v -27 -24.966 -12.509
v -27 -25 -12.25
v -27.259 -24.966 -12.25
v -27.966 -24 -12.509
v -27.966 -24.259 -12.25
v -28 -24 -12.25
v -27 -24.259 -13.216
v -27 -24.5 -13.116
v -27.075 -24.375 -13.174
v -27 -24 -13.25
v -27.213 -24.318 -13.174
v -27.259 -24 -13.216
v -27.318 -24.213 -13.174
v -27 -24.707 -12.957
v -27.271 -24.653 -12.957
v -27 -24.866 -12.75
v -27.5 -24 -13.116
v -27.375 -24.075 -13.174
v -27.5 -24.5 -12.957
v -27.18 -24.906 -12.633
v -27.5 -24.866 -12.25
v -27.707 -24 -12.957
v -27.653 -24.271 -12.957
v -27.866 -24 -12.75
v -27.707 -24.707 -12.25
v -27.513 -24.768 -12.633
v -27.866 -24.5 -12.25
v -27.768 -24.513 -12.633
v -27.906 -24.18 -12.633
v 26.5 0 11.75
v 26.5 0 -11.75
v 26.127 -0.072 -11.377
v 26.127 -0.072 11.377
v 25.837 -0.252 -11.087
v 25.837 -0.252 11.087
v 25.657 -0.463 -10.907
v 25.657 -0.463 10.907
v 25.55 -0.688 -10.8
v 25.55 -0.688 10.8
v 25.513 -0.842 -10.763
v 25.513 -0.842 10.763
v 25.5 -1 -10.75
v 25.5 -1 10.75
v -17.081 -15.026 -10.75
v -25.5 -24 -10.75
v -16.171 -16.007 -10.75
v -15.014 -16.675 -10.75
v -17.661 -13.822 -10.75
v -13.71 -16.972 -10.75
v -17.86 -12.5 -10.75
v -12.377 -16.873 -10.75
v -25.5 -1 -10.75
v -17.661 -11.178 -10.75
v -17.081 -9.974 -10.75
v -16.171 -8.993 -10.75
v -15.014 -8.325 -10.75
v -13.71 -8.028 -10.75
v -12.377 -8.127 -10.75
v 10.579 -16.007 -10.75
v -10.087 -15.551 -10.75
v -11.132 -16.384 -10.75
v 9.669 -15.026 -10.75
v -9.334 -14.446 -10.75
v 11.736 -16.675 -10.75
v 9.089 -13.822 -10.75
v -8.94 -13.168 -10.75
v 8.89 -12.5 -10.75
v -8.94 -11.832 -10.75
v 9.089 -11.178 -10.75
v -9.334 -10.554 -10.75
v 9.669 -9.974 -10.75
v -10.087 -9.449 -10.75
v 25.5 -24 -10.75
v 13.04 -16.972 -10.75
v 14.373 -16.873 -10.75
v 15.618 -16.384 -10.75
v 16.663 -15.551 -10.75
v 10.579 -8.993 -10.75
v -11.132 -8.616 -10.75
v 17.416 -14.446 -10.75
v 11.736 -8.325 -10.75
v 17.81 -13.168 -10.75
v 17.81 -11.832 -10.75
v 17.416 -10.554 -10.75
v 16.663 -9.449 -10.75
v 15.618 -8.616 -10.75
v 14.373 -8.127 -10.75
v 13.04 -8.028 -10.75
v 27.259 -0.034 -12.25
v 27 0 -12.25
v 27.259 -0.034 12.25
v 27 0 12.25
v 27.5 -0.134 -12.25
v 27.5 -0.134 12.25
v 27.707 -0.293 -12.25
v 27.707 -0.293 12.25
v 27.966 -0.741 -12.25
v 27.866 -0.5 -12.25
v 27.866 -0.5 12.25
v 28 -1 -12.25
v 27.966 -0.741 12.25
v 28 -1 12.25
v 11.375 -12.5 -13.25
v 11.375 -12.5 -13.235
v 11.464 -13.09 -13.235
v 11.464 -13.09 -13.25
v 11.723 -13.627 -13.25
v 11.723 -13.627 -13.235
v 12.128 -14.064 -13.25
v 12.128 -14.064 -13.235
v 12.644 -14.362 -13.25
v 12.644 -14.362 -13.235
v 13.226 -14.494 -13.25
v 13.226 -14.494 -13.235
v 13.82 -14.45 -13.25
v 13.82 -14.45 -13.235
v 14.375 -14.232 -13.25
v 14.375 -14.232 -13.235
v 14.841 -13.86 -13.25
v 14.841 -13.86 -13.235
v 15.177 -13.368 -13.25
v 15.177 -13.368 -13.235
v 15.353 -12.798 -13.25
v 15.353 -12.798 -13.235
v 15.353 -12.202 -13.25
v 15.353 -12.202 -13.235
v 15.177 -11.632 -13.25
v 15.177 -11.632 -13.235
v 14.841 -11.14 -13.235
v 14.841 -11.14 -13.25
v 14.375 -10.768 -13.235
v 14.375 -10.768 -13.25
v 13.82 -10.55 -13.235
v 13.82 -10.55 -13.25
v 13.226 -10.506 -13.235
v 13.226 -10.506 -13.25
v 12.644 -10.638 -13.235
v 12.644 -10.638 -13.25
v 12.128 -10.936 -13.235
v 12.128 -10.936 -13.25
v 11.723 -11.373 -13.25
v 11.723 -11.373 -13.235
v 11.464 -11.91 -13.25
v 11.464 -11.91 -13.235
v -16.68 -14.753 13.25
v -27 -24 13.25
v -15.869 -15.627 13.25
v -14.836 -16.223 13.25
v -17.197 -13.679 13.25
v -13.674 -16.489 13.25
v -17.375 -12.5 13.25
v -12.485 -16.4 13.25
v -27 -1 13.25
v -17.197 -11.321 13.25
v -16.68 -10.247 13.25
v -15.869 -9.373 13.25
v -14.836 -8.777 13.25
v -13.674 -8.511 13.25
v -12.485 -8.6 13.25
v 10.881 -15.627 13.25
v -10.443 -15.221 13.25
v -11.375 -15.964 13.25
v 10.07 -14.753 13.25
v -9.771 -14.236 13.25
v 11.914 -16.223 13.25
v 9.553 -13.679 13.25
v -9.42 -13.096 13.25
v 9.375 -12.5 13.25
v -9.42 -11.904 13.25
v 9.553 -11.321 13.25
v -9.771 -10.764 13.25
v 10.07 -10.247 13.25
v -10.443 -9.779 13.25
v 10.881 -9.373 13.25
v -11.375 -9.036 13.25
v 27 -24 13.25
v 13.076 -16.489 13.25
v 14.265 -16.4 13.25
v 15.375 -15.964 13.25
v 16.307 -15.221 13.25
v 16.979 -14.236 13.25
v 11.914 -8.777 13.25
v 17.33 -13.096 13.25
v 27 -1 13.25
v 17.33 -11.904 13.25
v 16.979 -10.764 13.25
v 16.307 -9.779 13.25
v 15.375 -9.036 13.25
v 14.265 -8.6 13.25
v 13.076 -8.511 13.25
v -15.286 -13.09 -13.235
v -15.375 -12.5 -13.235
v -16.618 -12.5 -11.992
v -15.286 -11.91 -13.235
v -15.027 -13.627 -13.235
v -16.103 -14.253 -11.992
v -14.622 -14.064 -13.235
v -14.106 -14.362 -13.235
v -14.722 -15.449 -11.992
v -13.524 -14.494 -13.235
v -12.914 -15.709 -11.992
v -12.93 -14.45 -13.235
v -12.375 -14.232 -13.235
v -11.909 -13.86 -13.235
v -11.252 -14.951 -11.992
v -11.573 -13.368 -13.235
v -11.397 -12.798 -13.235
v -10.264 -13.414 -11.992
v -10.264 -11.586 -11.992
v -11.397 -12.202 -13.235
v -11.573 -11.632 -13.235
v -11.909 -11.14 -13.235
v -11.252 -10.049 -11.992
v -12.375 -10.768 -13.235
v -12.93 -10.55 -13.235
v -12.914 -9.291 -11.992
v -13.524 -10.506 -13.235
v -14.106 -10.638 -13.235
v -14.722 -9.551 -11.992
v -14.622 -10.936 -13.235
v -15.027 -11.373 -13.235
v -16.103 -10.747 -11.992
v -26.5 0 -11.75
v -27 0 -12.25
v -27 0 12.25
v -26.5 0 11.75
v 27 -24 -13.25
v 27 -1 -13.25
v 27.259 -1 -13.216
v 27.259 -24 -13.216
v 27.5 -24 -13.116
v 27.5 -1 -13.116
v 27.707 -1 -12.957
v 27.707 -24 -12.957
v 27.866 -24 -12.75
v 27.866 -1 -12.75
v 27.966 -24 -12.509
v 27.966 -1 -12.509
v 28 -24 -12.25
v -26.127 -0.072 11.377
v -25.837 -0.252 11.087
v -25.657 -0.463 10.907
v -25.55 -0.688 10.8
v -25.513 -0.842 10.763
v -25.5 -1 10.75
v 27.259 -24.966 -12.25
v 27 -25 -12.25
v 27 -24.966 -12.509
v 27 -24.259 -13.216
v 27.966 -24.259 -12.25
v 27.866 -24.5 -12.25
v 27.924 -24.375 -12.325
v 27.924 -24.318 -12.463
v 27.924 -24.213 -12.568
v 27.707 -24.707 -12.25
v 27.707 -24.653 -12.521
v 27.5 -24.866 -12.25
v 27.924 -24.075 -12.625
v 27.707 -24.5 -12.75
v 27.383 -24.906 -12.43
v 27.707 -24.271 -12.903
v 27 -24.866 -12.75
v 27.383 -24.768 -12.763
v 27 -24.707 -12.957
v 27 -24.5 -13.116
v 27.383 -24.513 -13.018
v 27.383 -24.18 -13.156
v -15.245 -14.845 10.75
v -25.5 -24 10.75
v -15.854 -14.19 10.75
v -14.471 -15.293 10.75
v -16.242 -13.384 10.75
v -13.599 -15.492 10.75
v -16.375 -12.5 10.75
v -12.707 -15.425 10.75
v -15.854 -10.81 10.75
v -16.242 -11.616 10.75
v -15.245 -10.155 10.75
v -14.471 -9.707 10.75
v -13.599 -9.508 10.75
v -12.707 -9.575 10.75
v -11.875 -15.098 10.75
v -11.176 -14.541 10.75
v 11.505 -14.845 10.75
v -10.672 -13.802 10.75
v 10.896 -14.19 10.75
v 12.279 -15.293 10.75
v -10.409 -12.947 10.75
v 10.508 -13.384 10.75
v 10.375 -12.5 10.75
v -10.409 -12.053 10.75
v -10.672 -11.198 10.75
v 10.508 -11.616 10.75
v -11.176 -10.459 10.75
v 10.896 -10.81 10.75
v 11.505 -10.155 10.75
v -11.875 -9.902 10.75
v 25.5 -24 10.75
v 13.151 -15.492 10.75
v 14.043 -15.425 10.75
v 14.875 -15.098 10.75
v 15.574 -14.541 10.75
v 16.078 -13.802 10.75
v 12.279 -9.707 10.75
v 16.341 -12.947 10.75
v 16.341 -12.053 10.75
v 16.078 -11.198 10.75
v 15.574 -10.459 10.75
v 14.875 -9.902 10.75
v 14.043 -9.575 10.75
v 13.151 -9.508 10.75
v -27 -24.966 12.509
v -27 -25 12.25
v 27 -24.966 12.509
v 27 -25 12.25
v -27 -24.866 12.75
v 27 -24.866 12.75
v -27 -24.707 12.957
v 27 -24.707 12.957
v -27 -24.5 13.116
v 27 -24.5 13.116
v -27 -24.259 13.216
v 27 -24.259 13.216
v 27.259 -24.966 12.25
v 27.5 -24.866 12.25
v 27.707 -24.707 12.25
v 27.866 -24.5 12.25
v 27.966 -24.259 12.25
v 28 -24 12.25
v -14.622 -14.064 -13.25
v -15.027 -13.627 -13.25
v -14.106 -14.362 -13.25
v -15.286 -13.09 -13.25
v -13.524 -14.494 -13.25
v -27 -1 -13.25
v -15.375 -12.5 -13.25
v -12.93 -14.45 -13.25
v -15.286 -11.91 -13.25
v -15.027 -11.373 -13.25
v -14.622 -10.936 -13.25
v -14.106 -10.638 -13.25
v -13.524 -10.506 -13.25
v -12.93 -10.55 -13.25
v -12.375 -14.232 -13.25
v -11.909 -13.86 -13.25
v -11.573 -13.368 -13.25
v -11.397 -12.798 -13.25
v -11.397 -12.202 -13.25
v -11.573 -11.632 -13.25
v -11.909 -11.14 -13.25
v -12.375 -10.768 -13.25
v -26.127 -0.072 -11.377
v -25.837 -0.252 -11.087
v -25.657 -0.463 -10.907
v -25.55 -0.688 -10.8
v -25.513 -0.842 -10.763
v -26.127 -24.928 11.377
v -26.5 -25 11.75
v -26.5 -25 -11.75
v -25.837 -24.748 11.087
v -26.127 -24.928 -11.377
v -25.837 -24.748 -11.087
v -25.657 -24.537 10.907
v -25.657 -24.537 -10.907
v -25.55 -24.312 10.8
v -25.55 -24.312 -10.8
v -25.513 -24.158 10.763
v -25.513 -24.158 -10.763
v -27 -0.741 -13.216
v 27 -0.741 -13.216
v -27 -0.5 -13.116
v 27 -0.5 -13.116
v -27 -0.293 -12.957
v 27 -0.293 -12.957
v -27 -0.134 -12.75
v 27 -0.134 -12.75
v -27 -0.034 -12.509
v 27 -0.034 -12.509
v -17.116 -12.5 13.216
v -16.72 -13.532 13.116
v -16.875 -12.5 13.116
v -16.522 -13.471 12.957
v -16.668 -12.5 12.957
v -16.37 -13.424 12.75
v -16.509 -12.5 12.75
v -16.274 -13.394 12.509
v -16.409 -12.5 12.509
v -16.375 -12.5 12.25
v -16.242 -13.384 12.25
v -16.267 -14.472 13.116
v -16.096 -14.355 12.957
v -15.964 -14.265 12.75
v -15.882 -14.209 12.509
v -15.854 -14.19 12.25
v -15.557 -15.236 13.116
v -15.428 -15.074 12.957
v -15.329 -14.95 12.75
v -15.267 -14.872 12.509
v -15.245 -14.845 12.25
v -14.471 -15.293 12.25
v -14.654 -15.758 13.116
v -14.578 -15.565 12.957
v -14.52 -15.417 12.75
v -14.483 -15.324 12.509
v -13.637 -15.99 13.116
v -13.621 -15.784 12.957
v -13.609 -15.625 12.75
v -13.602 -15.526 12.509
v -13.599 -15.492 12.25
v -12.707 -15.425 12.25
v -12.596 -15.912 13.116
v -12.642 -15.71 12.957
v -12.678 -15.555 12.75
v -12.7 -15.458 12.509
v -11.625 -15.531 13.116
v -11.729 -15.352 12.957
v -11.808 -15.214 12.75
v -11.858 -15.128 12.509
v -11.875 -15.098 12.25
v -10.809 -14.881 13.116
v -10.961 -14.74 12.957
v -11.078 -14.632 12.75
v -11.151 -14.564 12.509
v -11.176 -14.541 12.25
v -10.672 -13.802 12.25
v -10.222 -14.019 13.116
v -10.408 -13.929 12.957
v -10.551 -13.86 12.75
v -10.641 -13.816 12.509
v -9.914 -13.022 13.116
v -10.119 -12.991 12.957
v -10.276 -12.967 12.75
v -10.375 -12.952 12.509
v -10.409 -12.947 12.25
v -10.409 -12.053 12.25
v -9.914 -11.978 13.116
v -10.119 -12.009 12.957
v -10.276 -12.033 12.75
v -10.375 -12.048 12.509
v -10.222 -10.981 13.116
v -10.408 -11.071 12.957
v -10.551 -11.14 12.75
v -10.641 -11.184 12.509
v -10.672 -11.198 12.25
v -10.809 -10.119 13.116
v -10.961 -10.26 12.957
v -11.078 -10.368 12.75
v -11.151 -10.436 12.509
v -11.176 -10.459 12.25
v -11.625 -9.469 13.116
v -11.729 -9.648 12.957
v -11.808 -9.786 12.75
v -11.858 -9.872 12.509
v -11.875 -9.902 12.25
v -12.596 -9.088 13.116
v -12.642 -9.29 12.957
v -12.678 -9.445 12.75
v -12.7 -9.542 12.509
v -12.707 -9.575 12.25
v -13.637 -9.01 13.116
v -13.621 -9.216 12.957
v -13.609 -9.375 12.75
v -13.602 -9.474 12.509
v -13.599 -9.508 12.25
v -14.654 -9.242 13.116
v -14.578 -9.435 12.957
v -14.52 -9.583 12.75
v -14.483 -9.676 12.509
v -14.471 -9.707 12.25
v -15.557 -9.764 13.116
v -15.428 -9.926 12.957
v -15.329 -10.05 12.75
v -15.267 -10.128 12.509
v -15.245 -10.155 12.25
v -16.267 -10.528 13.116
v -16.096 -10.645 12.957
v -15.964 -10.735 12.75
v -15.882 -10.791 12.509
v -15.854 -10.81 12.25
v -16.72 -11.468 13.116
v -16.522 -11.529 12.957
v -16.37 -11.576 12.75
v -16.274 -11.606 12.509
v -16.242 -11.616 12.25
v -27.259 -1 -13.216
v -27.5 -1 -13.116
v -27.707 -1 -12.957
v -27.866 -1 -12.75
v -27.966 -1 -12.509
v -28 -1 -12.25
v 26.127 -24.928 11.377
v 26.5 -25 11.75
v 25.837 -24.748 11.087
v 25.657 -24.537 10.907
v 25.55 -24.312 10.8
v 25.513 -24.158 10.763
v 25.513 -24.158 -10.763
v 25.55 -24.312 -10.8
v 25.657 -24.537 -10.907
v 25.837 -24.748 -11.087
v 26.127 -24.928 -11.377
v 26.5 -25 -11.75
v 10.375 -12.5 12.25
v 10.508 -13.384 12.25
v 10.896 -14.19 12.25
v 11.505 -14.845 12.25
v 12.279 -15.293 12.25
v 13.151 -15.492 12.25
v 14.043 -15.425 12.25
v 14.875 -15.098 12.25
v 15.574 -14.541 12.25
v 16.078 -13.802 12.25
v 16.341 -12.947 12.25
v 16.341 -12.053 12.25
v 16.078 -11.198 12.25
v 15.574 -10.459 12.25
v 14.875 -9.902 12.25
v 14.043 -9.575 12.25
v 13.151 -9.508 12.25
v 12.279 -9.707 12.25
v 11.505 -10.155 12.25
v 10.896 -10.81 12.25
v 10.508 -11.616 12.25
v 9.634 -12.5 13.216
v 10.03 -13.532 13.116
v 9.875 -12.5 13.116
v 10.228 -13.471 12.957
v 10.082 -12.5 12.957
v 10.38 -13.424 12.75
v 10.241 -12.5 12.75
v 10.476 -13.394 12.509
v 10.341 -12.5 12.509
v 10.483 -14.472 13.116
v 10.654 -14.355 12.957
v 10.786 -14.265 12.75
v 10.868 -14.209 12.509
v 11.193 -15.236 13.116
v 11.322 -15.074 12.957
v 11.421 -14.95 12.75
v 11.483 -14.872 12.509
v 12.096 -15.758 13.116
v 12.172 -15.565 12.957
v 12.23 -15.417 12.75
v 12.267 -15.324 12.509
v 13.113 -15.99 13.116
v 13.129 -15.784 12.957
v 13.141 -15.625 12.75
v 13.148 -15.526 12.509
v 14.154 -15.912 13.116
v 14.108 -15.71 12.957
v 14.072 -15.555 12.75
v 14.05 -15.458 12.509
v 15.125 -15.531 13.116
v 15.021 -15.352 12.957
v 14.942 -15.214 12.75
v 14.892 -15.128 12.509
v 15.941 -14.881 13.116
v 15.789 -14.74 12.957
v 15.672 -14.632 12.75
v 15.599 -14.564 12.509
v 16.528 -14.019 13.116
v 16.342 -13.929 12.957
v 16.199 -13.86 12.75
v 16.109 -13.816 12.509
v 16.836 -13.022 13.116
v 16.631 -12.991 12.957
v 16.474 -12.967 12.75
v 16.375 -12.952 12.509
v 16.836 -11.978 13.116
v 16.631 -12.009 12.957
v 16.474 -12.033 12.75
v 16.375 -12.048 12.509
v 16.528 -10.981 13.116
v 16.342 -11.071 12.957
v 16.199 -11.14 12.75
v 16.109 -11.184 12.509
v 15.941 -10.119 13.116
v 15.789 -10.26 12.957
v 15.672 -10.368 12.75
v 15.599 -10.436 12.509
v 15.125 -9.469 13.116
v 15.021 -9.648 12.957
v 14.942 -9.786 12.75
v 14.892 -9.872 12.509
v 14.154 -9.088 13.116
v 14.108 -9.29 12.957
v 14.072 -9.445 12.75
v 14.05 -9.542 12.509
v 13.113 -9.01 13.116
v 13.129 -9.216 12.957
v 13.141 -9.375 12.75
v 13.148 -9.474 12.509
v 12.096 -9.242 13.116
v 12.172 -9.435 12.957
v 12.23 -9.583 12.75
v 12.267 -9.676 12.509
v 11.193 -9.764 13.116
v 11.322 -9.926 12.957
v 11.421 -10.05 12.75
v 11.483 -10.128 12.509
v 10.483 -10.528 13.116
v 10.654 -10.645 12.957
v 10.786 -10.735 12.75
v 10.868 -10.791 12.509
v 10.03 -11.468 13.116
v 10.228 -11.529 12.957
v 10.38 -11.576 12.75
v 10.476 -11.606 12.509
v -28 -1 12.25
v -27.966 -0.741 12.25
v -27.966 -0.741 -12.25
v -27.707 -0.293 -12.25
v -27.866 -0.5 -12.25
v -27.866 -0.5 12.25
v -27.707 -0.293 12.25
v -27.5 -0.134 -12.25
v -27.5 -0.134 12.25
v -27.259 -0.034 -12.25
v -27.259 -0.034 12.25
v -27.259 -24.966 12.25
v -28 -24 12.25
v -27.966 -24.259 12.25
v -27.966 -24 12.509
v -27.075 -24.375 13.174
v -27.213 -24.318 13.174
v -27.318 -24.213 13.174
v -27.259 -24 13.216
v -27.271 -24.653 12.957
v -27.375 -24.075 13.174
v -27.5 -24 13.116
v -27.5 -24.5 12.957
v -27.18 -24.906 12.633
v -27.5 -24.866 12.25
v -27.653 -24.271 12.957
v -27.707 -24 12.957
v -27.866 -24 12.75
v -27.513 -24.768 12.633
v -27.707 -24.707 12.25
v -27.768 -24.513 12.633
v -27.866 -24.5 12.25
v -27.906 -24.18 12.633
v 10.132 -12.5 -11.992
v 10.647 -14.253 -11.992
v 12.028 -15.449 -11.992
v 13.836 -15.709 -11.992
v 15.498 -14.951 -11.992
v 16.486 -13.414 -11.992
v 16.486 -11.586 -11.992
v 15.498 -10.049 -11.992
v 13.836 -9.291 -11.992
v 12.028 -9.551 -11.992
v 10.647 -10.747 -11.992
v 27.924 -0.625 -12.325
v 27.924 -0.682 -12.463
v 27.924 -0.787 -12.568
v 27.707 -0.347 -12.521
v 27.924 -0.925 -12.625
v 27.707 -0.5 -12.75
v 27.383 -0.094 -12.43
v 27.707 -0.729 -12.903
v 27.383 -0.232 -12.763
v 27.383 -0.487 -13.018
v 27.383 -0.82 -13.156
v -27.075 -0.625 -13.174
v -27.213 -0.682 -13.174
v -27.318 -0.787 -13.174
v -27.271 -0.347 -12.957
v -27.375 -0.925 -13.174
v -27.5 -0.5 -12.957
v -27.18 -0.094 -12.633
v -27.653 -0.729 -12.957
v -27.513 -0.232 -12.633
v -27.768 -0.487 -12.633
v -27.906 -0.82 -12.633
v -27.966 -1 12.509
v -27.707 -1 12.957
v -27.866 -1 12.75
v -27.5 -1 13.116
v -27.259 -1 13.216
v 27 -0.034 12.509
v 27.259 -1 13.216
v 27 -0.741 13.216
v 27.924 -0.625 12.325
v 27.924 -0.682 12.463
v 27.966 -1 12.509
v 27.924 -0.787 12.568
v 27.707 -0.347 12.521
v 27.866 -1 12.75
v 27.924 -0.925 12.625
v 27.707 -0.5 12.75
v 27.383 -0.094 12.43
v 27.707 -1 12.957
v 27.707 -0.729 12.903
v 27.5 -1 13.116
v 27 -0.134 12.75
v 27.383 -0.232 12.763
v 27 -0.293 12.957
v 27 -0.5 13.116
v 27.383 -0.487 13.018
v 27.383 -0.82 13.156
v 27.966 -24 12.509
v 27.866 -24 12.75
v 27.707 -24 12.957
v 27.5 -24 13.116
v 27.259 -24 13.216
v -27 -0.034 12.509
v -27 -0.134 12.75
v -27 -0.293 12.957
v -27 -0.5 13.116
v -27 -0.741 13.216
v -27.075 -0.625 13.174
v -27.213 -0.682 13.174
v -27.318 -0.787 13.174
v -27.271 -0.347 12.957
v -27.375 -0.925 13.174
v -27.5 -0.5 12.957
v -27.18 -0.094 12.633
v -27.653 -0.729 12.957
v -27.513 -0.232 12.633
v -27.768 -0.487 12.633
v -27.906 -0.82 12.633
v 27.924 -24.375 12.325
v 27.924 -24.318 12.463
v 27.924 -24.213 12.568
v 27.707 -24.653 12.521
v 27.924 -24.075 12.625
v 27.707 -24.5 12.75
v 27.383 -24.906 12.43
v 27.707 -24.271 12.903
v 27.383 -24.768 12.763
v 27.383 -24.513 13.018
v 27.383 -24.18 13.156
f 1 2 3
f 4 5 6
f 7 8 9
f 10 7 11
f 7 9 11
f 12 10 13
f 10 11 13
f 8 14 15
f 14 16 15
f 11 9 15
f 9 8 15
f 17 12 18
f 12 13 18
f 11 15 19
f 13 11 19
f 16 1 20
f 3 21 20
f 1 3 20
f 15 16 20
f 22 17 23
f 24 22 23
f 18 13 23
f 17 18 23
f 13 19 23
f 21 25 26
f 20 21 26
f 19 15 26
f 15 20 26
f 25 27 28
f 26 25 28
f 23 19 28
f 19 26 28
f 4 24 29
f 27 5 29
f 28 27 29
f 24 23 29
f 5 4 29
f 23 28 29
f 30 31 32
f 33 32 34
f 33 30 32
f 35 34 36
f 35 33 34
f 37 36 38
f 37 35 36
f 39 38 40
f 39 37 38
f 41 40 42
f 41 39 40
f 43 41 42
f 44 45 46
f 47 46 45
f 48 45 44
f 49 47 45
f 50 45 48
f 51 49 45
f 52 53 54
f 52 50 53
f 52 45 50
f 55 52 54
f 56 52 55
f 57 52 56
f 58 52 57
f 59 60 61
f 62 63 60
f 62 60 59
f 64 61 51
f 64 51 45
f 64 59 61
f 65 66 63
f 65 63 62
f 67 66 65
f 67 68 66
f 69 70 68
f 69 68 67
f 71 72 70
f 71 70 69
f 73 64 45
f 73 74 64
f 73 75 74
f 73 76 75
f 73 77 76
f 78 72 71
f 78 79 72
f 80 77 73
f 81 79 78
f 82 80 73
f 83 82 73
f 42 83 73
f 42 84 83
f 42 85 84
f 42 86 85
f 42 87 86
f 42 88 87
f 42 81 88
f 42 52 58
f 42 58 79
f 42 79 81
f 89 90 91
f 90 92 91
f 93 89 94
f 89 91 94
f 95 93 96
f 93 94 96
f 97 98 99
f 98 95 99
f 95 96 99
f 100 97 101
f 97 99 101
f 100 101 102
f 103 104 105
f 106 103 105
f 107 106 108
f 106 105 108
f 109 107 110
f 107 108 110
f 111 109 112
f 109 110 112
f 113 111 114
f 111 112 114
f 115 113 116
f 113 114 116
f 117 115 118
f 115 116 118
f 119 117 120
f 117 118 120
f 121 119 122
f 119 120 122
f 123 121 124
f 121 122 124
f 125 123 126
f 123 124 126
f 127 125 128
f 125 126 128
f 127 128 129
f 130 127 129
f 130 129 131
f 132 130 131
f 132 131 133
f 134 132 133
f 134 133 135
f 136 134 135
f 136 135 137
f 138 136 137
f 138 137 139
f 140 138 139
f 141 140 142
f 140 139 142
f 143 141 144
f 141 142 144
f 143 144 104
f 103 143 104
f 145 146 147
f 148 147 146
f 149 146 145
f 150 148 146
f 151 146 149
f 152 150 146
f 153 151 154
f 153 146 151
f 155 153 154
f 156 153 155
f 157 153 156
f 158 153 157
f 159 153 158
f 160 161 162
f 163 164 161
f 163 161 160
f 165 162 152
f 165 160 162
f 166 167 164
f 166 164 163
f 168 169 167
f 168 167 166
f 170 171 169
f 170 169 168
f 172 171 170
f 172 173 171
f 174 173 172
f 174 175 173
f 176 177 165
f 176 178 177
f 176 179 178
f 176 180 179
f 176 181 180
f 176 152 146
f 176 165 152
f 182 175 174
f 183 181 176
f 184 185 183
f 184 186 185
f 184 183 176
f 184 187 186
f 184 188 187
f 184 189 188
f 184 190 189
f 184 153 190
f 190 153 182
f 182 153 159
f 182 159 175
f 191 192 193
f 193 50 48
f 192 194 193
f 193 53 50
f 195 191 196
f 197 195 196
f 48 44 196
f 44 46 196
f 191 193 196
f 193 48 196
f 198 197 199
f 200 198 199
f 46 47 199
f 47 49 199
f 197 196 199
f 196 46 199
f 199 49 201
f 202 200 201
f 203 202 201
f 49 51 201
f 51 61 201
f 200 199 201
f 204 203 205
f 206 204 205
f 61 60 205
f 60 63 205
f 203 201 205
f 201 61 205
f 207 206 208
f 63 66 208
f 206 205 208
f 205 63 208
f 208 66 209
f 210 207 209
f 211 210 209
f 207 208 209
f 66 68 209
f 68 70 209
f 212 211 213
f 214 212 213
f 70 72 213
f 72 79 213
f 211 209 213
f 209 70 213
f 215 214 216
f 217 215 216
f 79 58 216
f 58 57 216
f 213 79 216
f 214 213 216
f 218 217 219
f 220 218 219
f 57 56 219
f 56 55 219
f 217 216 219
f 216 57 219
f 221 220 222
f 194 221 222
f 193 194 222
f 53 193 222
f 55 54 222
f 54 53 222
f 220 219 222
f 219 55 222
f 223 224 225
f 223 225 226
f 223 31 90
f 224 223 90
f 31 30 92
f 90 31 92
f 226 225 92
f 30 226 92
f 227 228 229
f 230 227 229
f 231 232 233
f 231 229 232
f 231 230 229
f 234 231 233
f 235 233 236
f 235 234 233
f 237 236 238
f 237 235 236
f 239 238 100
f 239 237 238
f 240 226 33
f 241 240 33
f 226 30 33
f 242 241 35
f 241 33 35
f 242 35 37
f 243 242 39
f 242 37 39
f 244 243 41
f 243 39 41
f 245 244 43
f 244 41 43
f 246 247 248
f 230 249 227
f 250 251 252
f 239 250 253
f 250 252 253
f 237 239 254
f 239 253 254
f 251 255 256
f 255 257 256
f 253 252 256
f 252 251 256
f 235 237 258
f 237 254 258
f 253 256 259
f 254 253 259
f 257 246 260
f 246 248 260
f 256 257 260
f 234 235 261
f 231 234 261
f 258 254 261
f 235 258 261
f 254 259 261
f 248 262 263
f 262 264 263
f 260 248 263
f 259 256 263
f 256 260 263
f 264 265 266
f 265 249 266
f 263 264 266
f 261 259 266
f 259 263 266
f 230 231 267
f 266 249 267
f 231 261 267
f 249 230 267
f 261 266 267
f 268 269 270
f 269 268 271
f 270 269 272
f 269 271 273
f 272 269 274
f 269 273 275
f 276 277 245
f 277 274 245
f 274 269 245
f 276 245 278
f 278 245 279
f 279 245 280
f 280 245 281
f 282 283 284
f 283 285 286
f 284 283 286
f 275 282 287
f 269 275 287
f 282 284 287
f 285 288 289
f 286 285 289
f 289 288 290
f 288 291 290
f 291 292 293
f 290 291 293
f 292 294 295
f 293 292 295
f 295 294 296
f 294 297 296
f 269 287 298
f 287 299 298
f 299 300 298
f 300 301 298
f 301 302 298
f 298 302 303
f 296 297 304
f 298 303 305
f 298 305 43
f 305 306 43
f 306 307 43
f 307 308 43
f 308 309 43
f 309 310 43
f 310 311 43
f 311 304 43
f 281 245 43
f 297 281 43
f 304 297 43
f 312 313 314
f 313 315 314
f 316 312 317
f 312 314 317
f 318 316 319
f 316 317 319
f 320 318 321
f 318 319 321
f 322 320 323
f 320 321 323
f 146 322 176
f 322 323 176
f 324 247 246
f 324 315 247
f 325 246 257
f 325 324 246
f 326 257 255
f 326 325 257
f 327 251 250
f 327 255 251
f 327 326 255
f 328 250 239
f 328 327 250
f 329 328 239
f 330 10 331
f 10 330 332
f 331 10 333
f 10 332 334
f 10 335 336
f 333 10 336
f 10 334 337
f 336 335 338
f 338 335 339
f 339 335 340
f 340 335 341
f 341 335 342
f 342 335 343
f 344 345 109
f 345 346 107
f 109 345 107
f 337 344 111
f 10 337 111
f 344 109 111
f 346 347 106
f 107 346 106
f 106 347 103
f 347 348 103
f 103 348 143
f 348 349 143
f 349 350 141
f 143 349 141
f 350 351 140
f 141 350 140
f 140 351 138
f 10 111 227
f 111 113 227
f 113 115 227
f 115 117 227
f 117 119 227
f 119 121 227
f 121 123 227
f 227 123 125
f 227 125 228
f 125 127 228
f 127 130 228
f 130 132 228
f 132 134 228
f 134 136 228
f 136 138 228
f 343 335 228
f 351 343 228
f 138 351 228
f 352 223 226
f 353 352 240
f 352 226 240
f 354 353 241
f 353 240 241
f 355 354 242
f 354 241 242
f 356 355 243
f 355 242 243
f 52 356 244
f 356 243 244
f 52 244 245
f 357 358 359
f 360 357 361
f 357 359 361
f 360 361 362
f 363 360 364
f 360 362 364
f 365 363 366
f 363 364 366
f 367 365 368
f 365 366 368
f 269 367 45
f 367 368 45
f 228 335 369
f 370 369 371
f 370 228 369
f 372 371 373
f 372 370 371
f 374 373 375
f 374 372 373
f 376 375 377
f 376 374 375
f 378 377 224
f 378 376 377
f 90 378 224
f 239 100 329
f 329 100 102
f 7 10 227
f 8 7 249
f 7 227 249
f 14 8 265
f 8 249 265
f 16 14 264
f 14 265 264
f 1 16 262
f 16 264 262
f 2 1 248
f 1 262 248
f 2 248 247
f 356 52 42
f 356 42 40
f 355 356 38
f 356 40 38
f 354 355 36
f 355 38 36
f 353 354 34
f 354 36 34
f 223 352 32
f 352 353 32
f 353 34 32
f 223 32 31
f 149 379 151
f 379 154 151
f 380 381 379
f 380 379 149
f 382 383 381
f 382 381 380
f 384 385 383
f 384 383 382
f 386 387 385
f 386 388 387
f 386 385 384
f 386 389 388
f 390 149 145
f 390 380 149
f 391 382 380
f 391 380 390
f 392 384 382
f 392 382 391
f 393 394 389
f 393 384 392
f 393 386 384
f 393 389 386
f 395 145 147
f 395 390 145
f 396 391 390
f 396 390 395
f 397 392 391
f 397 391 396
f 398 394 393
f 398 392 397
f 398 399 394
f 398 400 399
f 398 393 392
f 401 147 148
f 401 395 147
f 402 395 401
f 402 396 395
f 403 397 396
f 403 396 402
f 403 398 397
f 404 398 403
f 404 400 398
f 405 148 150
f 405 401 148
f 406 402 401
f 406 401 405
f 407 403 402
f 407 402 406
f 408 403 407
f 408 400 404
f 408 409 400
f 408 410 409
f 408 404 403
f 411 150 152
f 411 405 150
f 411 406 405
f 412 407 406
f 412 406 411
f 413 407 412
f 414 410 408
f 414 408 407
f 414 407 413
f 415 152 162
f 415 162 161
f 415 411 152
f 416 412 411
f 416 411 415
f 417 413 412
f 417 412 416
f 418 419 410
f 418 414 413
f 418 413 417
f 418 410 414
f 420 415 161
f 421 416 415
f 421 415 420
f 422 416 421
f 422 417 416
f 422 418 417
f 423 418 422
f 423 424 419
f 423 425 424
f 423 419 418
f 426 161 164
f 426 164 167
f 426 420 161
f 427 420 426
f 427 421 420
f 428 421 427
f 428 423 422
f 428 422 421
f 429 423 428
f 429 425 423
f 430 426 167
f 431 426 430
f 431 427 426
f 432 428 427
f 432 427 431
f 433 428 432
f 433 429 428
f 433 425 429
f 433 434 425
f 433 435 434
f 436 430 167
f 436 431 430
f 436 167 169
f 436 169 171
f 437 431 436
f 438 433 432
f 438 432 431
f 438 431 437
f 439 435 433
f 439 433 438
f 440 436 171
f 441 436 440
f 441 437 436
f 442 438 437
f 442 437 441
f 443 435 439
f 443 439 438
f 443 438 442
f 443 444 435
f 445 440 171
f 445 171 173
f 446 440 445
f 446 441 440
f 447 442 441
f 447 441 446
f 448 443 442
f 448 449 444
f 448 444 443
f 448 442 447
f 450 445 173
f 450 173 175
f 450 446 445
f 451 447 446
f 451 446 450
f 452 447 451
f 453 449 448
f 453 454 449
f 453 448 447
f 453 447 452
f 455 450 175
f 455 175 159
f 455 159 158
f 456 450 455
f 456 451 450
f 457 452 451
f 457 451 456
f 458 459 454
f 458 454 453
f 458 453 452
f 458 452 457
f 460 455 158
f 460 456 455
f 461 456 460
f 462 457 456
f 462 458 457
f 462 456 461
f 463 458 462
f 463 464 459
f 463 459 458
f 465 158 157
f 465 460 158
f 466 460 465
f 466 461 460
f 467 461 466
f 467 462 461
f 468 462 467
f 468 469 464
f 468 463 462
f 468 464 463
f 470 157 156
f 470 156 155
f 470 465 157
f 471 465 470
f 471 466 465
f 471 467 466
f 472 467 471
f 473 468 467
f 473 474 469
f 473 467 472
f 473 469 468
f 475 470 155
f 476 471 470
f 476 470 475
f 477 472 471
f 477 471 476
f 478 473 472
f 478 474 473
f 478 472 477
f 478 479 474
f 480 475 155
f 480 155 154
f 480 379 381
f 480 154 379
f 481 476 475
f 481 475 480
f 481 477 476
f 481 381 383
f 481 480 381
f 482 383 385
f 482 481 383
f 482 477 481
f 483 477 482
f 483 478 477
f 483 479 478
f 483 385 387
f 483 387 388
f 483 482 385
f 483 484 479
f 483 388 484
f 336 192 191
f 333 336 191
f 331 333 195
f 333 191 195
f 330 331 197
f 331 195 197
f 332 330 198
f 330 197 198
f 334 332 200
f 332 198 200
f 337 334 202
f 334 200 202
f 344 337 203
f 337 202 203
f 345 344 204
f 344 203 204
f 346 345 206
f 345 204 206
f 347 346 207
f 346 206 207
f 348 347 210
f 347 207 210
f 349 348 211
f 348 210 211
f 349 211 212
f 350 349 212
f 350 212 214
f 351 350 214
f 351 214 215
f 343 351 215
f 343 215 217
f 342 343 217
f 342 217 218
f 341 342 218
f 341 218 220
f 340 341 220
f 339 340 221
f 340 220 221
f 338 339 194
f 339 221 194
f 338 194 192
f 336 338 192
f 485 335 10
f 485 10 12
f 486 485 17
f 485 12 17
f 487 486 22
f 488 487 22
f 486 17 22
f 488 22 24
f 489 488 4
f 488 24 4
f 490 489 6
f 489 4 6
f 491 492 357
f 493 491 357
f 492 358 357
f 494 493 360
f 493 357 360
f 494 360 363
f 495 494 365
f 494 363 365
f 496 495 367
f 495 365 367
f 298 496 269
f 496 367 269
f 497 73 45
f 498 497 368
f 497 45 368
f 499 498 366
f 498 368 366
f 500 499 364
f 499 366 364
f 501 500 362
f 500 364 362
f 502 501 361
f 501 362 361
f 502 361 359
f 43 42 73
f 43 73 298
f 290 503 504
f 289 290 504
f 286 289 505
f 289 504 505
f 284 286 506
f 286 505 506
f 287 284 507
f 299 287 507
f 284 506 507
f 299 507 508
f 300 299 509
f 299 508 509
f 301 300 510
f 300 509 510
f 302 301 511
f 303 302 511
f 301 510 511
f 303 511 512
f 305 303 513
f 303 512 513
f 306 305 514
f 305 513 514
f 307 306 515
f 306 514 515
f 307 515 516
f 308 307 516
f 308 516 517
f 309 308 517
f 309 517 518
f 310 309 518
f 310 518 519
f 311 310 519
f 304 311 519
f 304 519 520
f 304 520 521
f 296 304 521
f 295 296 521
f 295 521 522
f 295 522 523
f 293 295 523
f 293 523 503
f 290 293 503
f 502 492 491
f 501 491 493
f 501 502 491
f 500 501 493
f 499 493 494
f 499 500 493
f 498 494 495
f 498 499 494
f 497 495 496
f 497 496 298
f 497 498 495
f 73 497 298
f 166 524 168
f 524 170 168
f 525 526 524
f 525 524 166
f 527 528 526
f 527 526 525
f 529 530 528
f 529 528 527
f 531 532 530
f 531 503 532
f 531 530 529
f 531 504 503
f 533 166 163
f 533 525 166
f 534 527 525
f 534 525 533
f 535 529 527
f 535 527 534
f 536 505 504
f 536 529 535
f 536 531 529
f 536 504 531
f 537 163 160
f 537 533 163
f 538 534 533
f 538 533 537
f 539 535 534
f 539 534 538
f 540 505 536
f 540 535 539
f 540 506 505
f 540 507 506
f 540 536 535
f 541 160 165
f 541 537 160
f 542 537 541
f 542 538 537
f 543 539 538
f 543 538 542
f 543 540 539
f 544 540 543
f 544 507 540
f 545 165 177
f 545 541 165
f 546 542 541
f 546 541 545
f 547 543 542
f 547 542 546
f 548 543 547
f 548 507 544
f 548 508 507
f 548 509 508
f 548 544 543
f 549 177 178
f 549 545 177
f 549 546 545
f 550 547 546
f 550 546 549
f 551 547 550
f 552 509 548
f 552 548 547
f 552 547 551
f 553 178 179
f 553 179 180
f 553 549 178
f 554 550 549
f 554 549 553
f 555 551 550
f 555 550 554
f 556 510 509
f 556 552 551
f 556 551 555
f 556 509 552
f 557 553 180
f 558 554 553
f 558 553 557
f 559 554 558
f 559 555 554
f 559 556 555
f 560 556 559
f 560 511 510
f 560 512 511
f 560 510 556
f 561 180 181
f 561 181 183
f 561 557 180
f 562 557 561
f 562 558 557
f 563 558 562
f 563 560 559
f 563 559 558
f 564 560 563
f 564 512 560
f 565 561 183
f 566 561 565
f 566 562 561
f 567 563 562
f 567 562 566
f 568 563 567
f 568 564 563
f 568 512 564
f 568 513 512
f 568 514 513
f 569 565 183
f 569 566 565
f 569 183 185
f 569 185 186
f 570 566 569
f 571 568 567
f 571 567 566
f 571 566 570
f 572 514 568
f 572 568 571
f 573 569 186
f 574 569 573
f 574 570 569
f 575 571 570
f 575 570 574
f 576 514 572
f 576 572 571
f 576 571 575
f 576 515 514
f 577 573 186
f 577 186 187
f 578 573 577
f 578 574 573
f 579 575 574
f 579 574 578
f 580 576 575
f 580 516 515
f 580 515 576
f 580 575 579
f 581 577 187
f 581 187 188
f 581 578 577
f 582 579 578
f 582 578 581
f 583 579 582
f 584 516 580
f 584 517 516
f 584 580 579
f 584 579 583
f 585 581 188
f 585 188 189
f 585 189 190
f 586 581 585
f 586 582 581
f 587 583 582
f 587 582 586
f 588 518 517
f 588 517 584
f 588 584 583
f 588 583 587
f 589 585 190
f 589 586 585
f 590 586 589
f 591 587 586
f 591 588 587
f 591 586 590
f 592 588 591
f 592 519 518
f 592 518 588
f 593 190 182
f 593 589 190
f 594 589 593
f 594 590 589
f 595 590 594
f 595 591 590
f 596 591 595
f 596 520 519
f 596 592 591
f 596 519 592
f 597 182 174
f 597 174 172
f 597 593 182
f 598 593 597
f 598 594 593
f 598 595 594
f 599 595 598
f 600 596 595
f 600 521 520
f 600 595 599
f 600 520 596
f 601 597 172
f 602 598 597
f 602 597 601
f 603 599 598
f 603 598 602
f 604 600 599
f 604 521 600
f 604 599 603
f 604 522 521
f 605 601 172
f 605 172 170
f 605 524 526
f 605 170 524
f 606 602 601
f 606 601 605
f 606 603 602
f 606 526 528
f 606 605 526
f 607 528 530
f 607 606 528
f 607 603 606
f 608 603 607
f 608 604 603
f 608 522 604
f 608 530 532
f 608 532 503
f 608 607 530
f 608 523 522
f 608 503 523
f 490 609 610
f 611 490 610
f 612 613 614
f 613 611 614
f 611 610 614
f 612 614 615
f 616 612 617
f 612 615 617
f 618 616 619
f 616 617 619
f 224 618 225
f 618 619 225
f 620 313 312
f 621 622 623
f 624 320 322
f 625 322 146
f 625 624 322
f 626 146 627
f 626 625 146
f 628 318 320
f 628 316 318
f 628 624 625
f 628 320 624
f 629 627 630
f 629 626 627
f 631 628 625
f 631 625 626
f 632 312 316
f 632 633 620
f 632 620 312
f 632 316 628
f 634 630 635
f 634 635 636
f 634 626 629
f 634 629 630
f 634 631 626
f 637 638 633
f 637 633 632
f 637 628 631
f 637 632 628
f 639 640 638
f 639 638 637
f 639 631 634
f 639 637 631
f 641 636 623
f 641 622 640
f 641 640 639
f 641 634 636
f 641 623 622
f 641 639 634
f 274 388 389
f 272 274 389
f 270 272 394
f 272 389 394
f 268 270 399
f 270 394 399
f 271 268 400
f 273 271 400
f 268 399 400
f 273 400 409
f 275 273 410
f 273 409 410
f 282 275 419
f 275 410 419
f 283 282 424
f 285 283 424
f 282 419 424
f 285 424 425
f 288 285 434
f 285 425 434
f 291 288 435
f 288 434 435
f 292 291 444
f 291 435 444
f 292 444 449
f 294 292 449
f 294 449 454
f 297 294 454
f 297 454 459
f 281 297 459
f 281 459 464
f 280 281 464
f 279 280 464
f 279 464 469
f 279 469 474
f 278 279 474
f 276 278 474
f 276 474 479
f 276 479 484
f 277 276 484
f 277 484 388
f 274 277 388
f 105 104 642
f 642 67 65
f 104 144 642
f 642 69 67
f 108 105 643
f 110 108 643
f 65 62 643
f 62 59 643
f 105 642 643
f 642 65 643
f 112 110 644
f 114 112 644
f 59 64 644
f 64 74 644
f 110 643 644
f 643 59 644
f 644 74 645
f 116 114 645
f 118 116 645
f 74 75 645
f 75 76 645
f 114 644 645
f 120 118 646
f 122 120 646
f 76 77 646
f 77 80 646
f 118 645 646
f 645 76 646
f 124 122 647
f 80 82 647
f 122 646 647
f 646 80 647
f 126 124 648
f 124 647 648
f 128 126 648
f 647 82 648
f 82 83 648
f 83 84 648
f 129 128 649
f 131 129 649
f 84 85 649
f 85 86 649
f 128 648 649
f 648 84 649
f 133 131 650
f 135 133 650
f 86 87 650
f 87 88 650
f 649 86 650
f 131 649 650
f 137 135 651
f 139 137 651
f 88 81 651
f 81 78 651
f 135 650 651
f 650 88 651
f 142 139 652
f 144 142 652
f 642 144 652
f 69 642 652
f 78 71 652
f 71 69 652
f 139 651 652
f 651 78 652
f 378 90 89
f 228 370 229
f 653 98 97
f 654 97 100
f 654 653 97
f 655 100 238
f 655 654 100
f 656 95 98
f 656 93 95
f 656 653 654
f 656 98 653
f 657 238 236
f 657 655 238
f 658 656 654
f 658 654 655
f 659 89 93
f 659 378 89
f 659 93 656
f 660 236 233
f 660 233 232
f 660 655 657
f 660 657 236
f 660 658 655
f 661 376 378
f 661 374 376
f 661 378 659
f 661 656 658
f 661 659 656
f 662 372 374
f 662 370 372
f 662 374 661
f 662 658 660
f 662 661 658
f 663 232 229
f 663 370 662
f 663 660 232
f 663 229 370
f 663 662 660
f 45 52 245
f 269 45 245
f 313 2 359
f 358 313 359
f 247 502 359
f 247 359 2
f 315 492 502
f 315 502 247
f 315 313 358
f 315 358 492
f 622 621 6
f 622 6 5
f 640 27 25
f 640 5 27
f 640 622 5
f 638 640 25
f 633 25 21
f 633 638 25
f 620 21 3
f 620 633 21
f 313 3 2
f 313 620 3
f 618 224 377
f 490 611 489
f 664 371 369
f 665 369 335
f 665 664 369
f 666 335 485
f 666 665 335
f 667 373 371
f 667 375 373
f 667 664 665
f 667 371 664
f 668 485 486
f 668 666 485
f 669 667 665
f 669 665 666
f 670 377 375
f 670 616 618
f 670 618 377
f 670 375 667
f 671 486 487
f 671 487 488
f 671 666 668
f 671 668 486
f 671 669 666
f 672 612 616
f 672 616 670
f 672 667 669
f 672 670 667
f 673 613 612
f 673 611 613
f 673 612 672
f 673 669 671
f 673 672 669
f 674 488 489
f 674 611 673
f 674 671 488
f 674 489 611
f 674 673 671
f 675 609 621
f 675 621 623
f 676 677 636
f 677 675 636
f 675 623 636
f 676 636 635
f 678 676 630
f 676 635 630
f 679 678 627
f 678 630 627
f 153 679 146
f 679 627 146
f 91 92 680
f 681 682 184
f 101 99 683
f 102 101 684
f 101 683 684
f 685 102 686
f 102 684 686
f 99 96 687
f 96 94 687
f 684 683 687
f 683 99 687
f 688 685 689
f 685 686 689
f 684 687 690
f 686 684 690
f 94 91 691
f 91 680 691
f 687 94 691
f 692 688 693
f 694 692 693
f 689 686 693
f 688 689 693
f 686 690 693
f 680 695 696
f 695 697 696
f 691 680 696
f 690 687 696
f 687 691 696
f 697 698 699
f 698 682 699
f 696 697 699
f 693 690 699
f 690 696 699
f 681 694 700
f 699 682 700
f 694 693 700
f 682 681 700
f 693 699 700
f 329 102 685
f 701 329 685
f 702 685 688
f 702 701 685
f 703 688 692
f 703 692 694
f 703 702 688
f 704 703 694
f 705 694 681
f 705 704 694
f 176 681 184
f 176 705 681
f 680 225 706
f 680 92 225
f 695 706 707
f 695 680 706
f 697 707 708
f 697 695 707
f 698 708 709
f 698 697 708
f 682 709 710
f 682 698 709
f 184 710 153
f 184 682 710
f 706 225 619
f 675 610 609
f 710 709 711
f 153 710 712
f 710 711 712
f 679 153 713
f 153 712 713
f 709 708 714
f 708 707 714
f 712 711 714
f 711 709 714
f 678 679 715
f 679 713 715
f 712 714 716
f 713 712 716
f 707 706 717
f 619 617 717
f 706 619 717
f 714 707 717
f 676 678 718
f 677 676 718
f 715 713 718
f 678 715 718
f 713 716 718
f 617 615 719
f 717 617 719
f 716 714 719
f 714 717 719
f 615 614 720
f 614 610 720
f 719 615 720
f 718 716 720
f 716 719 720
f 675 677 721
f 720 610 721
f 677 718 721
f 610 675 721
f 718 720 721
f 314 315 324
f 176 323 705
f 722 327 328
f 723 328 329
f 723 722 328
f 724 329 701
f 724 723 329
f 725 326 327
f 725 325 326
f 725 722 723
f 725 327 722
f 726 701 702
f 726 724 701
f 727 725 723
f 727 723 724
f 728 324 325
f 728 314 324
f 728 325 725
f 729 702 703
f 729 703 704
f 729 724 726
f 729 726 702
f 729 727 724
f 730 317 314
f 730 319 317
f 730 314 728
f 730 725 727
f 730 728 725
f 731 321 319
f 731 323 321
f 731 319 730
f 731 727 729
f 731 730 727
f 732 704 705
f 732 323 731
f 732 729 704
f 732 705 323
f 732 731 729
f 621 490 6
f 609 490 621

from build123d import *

# Parameters (mm, degrees)
SKETCH_W          = 56
SKETCH_H          = 26.5
PAD_DEPTH         = 25
SKETCH001_W       = 51
SKETCH001_H       = 21.5
POCKET_DEPTH      = 0.001
POCKET_DEPTH_BACK = 25.001
SKETCH002_R       = 3
POCKET001_DEPTH   = 3.5
SKETCH003_R       = 2
POCKET002_DEPTH   = 2.5
CHAMFER_SIZE      = 2.485
FILLET_R          = 1


with BuildPart() as part:
    # Sketch → Pad (new body)
    with BuildSketch(Plane.XZ):
        Rectangle(SKETCH_W, SKETCH_H)
    extrude(amount=PAD_DEPTH)

    # Sketch001 → Pocket (cut, two sides)
    with BuildSketch(Plane.XZ) as pocket_sk:
        Rectangle(SKETCH001_W, SKETCH001_H)
    extrude(amount=-POCKET_DEPTH, mode=Mode.SUBTRACT)
    extrude(pocket_sk.sketch, amount=POCKET_DEPTH_BACK, mode=Mode.SUBTRACT)

    # Sketch002 (on DatumPlane) → Pocket001 (cut)
    with BuildSketch(Plane(origin=(0, 0, 13.25), x_dir=(-1, 0, 0), z_dir=(0, 0, 1))):
        with Locations((-13.375, 12.5)):
            Circle(SKETCH002_R)
        with Locations((13.375, 12.5)):
            Circle(SKETCH002_R)
    extrude(amount=-POCKET001_DEPTH, mode=Mode.SUBTRACT)

    # Sketch003 (on DatumPlane) → Pocket002 (cut)
    with BuildSketch(Plane(origin=(0, 0, -10.75), x_dir=(-1, 0, 0), z_dir=(0, 0, 1))):
        with Locations((-13.375, 12.5)):
            Circle(SKETCH003_R)
        with Locations((13.375, 12.5)):
            Circle(SKETCH003_R)
    extrude(amount=-POCKET002_DEPTH, mode=Mode.SUBTRACT)

    # Chamfer
    chamfer_edges = [part.edges().sort_by_distance(p)[0] for p in [
        (-11.375, -12.5, -10.75),
        (15.375, -12.5, -10.75),
    ]]
    chamfer(chamfer_edges, length=CHAMFER_SIZE)

    # Fillet
    fillet_edges = [part.edges().sort_by_distance(p)[0] for p in [
        (-28, -25, 0),
        (0, -25, 13.25),
        (0, -25, -13.25),
        (28, -25, 0),
        (-25.5, -25, 0),
        (0, -25, 10.75),
        (25.5, -25, 0),
        (0, -25, -10.75),
        (-28, 0, 0),
        (0, 0, 13.25),
        (0, 0, -13.25),
        (28, 0, 0),
        (-25.5, 0, 0),
        (0, 0, 10.75),
        (25.5, 0, 0),
        (0, 0, -10.75),
        (28, -12.5, 13.25),
        (28, -12.5, -13.25),
        (-28, -12.5, -13.25),
        (-28, -12.5, 13.25),
        (16.375, -12.5, 13.25),
        (-10.375, -12.5, 13.25),
    ]]
    fillet(fillet_edges, radius=FILLET_R)


solid = part.part
